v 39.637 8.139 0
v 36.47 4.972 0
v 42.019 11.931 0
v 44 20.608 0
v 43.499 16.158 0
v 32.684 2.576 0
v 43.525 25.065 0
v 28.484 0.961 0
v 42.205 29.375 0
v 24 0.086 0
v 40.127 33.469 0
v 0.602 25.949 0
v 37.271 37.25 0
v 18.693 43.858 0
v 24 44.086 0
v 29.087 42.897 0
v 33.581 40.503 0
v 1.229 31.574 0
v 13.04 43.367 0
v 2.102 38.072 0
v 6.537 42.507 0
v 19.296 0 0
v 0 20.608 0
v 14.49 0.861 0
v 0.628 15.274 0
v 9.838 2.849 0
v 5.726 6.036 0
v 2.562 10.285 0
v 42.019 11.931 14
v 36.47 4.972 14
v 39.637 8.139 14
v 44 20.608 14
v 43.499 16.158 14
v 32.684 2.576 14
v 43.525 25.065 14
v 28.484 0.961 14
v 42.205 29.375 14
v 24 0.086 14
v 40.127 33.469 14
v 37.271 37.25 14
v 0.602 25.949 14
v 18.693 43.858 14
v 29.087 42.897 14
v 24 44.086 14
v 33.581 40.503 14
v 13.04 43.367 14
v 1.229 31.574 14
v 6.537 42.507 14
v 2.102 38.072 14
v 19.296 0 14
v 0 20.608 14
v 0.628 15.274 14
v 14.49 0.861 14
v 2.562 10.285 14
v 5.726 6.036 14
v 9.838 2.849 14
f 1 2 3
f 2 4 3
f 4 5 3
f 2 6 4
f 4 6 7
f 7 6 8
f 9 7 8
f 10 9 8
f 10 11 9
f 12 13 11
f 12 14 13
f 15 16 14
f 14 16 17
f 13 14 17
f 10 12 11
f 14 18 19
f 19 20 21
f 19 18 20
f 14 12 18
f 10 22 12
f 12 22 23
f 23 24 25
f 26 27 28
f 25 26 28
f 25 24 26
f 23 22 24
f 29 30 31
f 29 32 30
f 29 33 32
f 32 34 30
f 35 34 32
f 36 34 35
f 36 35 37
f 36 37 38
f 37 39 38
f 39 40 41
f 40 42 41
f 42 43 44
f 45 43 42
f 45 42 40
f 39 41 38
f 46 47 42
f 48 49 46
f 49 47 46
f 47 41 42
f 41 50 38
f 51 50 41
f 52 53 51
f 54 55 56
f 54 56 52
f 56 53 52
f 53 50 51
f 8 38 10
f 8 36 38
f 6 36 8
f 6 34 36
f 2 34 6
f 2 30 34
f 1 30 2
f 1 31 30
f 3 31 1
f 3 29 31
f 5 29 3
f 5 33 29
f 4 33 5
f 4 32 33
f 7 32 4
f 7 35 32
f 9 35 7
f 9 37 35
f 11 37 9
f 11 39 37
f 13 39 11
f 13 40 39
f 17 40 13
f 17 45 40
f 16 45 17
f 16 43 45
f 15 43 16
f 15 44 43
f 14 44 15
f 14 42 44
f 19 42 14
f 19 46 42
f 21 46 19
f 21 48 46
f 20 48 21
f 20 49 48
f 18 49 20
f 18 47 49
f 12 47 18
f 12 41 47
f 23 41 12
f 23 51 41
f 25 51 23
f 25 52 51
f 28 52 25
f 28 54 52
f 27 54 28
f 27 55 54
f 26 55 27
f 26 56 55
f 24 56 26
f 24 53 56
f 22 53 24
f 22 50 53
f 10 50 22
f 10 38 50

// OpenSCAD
$fn = 32;

// ----------------------------------------------------------------------
// Cam disc: base radius 20.0 mm, lift 4.0 mm, 28 profile points
// ----------------------------------------------------------------------

// --- parameters (mm) ---
profile_height = 14;      // extrusion height
profile_points = 28;      // points of the closed outline

profile = [[44, 20.608], [43.525, 25.065], [42.205, 29.375], [40.127, 33.469], [37.271, 37.25], [33.581, 40.503], [29.087, 42.897], [24, 44.086], [18.693, 43.858], [13.04, 43.367], [6.537, 42.507], [2.102, 38.072], [1.229, 31.574], [0.602, 25.949], [0, 20.608], [0.628, 15.274], [2.562, 10.285], [5.726, 6.036], [9.838, 2.849], [14.49, 0.861], [19.296, 0], [24, 0.086], [28.484, 0.961], [32.684, 2.576], [36.47, 4.972], [39.637, 8.139], [42.019, 11.931], [43.499, 16.158]];  // single closed polygon, 28 points, counter clockwise

// --- the one profile operation ---
linear_extrude(height = profile_height) polygon(points = profile);
